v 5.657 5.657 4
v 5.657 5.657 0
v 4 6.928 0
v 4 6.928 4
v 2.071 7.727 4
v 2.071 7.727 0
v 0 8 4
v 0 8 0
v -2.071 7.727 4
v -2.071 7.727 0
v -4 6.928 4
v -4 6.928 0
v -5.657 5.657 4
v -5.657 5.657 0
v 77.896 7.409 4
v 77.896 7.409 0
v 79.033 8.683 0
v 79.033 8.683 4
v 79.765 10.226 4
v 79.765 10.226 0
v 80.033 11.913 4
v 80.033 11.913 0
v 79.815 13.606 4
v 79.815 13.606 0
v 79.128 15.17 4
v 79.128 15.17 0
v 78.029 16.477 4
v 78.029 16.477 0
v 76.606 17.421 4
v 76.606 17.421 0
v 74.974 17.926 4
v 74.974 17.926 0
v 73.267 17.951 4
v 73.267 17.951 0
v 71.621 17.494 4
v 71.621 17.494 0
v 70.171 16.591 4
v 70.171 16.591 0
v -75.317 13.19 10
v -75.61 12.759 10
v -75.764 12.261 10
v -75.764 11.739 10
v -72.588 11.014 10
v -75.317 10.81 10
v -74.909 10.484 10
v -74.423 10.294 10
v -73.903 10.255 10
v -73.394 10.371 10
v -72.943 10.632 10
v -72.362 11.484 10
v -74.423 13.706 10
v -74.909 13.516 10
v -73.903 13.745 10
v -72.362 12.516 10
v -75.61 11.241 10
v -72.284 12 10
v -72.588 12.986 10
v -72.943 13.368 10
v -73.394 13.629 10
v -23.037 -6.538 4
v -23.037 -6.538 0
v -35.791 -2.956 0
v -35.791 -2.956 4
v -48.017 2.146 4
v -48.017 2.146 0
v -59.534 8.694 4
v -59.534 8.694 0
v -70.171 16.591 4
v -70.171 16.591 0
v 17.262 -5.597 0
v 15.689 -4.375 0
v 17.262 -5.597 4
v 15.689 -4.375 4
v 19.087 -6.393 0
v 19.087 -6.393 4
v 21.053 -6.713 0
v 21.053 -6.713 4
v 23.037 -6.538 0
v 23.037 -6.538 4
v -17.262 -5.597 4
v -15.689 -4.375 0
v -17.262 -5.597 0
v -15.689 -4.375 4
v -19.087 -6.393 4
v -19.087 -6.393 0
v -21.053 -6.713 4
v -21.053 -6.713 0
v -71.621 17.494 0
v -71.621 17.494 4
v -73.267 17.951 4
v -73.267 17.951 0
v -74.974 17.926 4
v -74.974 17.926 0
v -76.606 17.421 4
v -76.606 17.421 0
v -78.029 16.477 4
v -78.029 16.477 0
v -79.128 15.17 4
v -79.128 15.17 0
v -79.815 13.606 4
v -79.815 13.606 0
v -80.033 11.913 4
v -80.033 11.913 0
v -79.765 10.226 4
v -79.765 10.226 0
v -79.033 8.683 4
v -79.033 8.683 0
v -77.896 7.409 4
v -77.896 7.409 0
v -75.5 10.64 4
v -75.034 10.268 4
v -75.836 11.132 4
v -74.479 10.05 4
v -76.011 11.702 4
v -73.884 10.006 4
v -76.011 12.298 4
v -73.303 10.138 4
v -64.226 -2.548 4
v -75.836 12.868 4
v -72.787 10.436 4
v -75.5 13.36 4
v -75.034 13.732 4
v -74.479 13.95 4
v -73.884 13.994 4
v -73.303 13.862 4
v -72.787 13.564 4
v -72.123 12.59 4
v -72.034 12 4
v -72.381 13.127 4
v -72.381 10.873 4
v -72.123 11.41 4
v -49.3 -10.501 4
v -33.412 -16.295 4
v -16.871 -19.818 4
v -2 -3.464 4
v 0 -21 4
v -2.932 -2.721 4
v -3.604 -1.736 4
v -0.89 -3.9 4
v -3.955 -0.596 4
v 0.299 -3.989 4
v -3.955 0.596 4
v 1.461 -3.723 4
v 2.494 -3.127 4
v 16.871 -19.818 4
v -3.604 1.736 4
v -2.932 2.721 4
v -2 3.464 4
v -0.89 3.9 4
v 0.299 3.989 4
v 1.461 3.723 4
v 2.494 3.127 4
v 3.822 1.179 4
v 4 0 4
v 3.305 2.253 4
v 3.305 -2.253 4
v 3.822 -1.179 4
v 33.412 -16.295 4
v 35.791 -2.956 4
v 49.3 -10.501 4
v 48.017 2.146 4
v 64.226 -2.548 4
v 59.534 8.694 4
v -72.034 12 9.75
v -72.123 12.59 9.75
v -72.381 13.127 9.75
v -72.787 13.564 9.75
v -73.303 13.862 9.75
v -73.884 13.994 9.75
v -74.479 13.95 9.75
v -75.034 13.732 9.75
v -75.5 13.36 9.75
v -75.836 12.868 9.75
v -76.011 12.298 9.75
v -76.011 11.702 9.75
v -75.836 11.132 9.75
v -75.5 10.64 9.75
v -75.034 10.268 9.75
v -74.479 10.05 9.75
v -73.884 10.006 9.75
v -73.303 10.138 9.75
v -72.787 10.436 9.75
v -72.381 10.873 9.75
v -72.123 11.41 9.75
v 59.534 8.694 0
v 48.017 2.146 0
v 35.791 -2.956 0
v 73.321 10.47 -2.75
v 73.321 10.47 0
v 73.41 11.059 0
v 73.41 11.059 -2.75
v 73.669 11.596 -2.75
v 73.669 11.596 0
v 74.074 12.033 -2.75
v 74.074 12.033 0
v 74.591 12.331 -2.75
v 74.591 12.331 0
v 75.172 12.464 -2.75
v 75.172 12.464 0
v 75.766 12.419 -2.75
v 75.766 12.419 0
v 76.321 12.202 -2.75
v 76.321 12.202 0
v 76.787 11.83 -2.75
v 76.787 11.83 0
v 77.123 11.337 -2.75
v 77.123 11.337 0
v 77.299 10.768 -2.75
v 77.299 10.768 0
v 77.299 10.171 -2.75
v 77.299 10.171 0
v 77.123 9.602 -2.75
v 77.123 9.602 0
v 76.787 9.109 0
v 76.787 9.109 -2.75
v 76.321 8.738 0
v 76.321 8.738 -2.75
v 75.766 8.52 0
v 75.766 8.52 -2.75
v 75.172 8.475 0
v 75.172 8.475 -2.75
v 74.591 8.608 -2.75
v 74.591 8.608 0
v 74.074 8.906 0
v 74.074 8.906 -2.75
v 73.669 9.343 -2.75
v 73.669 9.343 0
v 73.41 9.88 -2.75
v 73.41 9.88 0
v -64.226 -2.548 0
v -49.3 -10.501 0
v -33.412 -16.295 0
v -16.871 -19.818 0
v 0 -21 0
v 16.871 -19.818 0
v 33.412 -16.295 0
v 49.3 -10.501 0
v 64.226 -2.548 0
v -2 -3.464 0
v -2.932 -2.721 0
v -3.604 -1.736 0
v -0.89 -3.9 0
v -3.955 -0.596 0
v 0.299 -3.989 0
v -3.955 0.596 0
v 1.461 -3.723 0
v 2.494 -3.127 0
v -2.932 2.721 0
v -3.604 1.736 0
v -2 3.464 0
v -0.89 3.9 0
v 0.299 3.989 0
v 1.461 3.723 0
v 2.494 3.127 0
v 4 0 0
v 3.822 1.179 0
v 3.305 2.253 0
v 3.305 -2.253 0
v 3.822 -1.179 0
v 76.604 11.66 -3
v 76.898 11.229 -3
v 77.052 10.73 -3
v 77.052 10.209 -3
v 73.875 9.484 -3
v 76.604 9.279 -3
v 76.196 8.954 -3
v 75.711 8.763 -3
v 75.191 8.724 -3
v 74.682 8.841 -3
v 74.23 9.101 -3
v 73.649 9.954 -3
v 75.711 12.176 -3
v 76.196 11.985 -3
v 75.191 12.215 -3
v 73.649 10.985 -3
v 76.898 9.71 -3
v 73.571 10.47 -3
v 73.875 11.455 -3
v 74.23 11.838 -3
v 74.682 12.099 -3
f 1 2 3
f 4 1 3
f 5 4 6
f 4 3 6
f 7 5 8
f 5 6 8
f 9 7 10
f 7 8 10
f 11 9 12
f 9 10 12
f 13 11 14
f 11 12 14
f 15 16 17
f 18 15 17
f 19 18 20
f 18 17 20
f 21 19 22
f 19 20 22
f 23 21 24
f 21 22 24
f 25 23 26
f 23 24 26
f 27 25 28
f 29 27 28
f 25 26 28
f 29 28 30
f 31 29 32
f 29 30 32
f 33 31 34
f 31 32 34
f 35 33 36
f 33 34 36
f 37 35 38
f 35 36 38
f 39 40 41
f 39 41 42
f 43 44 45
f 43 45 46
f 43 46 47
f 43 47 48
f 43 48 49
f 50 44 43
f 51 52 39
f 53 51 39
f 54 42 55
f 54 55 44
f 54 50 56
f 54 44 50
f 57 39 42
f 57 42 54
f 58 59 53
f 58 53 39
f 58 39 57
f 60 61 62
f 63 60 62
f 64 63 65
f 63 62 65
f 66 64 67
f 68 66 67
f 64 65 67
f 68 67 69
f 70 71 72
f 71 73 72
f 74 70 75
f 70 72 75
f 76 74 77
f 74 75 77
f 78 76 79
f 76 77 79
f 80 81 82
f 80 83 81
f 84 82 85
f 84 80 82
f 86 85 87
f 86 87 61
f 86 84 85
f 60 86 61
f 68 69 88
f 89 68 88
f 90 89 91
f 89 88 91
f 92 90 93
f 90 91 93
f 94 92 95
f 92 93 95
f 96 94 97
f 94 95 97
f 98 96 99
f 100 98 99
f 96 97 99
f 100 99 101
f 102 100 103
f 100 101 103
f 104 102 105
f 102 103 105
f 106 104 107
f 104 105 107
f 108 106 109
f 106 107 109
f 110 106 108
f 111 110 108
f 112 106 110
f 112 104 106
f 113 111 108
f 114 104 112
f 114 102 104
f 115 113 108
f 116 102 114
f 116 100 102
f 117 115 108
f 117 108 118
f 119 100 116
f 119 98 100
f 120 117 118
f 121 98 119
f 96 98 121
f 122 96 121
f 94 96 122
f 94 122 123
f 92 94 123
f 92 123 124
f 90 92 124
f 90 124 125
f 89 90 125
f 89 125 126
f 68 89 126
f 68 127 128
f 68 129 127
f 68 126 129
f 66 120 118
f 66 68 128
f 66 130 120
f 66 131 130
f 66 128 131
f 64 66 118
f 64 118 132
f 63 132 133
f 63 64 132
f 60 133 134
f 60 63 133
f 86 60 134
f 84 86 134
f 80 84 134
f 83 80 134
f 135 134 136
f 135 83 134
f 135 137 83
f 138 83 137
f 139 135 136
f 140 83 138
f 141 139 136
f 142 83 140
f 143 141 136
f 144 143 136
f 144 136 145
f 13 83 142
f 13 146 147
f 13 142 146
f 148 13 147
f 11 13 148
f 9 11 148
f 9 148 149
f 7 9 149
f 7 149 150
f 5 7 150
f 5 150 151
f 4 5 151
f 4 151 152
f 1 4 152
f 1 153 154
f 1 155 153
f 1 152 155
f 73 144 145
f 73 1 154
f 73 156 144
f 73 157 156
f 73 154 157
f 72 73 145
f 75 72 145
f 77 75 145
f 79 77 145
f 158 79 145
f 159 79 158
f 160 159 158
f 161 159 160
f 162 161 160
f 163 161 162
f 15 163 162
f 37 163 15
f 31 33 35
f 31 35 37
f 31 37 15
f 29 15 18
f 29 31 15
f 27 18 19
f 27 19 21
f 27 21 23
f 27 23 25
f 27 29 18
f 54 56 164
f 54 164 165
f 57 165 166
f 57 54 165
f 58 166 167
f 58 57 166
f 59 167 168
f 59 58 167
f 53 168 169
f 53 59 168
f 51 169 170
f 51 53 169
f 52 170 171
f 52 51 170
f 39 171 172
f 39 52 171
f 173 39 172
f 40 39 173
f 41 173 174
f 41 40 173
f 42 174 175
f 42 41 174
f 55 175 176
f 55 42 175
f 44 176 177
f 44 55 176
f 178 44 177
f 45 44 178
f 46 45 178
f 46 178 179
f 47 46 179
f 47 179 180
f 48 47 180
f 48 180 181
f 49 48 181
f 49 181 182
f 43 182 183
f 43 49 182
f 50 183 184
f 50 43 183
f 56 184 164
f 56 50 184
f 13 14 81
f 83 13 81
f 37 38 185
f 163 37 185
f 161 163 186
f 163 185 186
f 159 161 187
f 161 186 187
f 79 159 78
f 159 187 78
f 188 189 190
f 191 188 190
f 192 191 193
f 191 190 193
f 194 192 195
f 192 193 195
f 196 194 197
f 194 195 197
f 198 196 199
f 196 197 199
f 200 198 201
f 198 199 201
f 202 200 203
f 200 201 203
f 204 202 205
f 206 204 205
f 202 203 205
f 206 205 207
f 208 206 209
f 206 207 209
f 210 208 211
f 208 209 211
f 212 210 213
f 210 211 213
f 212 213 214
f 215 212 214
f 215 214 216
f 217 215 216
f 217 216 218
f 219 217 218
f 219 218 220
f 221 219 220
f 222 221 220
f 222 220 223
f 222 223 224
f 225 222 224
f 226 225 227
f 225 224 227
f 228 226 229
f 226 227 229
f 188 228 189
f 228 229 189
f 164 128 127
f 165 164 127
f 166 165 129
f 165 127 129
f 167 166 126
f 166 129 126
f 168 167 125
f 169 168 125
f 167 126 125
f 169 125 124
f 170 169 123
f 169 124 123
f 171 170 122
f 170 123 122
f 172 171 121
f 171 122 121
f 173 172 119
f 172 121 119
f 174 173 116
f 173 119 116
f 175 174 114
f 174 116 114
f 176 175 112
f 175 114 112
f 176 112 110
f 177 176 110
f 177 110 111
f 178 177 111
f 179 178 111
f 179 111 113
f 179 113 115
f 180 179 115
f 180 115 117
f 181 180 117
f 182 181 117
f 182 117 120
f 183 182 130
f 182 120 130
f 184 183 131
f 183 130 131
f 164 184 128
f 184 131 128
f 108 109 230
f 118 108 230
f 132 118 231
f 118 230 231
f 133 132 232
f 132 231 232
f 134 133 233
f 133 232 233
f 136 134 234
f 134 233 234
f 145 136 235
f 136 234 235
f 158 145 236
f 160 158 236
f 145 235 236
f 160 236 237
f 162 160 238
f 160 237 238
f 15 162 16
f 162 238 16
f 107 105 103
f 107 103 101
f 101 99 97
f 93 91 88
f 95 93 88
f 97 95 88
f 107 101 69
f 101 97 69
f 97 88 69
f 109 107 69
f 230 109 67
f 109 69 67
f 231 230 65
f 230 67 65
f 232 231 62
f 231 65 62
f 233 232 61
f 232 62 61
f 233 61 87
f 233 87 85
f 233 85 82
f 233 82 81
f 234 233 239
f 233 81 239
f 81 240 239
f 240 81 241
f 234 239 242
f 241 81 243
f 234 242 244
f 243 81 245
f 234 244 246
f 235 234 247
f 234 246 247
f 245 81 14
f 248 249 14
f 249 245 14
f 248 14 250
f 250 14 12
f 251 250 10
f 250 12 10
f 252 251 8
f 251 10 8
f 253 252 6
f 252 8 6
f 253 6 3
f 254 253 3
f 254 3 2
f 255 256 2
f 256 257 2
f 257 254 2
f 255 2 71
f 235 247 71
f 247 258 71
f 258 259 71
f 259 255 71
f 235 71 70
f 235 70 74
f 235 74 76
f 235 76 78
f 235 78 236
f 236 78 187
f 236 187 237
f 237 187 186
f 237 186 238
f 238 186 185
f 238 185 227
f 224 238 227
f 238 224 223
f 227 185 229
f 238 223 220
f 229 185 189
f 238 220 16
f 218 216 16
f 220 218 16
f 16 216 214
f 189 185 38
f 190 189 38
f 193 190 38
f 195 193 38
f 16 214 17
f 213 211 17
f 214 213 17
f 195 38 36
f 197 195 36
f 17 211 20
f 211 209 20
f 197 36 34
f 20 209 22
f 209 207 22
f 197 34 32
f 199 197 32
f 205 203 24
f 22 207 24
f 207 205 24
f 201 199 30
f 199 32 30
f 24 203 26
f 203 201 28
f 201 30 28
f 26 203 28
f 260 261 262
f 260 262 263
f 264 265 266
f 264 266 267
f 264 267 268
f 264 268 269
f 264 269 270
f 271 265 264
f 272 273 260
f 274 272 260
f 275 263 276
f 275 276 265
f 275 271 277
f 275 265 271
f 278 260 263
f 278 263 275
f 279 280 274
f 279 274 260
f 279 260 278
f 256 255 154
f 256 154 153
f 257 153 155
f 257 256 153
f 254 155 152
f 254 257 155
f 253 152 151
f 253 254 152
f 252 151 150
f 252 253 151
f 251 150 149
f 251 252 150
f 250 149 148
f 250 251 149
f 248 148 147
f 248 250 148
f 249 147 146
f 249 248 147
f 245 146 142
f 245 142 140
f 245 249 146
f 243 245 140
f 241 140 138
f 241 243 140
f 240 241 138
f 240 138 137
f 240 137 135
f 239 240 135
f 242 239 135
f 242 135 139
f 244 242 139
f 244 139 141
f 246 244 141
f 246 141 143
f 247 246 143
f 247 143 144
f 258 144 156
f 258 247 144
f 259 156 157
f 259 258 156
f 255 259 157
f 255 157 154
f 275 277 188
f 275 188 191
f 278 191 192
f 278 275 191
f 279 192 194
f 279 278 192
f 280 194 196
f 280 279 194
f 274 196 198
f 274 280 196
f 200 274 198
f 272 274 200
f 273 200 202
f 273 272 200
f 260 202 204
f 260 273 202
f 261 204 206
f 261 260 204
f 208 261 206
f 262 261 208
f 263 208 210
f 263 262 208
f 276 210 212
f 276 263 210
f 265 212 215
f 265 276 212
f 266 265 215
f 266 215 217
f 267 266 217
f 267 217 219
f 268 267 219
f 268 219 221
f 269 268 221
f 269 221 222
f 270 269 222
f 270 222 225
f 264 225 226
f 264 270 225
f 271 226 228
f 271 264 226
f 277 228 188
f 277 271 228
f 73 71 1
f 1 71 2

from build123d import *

# Parameters (mm, degrees)
SKETCH1_R           = 4
BOSS_EXTRUDE1_DEPTH = 4
SKETCH2_R           = 2
BOSS_EXTRUDE2_DEPTH = 6
CHAMFER1_SIZE       = 0.25
SKETCH3_R           = 2
BOSS_EXTRUDE3_DEPTH = 3
CHAMFER2_SIZE       = 0.25
FILLET2_R           = 8


with BuildPart() as part:
    # Sketch1 → Boss-Extrude1 (new body)
    with BuildSketch(Plane.XY):
        with BuildLine():
            ThreePointArc((5.656854249, 5.656854249), (0, 8), (-5.656854249, 5.656854249))
            Line((-5.656854249, 5.656854249), (-18.697995031, -7.384286532))
            ThreePointArc((-18.697995031, -7.384286532), (-46.023235671, 1.192804635), (-70.171144566, 16.591303421))
            ThreePointArc((-70.171144566, 16.591303421), (-78.62508069, 15.86263065), (-77.896407918, 7.408694525))
            ThreePointArc((-77.896407918, 7.408694525), (0, -21), (77.896407918, 7.408694525))
            ThreePointArc((77.896407918, 7.408694525), (78.62508069, 15.86263065), (70.171144566, 16.591303421))
            ThreePointArc((70.171144566, 16.591303421), (46.023235671, 1.192804635), (18.697995031, -7.384286532))
            Line((18.697995031, -7.384286532), (5.656854249, 5.656854249))
        make_face()
        Circle(SKETCH1_R, mode=Mode.SUBTRACT)
    extrude(amount=BOSS_EXTRUDE1_DEPTH)

    # Sketch2 → Boss-Extrude2 (add)
    with BuildSketch(Plane.XY.offset(4)):
        with Locations((-74.033776242, 11.999998973)):
            Circle(SKETCH2_R)
    extrude(amount=BOSS_EXTRUDE2_DEPTH)

    # Chamfer1
    chamfer1_edges = [part.edges().sort_by_distance(p)[0] for p in [
        (-76.033776242, 11.999998973, 10),
    ]]
    chamfer(chamfer1_edges, length=CHAMFER1_SIZE)

    # Sketch3 → Boss-Extrude3 (add)
    with BuildSketch(Plane(origin=(0, 0, 0), x_dir=(-1, 0, 0), z_dir=(0, 0, -1))):
        with Locations((-75.321320134, 10.469564157)):
            Circle(SKETCH3_R)
    extrude(amount=BOSS_EXTRUDE3_DEPTH)

    # Chamfer2
    chamfer2_edges = [part.edges().sort_by_distance(p)[0] for p in [
        (77.321320134, 10.469564157, -3),
    ]]
    chamfer(chamfer2_edges, length=CHAMFER2_SIZE)

    # Fillet2
    fillet2_edges = [part.edges().sort_by_distance(p)[0] for p in [
        (18.697995031, -7.384286532, 2),
        (-18.697995031, -7.384286532, 2),
    ]]
    fillet(fillet2_edges, radius=FILLET2_R)


solid = part.part
